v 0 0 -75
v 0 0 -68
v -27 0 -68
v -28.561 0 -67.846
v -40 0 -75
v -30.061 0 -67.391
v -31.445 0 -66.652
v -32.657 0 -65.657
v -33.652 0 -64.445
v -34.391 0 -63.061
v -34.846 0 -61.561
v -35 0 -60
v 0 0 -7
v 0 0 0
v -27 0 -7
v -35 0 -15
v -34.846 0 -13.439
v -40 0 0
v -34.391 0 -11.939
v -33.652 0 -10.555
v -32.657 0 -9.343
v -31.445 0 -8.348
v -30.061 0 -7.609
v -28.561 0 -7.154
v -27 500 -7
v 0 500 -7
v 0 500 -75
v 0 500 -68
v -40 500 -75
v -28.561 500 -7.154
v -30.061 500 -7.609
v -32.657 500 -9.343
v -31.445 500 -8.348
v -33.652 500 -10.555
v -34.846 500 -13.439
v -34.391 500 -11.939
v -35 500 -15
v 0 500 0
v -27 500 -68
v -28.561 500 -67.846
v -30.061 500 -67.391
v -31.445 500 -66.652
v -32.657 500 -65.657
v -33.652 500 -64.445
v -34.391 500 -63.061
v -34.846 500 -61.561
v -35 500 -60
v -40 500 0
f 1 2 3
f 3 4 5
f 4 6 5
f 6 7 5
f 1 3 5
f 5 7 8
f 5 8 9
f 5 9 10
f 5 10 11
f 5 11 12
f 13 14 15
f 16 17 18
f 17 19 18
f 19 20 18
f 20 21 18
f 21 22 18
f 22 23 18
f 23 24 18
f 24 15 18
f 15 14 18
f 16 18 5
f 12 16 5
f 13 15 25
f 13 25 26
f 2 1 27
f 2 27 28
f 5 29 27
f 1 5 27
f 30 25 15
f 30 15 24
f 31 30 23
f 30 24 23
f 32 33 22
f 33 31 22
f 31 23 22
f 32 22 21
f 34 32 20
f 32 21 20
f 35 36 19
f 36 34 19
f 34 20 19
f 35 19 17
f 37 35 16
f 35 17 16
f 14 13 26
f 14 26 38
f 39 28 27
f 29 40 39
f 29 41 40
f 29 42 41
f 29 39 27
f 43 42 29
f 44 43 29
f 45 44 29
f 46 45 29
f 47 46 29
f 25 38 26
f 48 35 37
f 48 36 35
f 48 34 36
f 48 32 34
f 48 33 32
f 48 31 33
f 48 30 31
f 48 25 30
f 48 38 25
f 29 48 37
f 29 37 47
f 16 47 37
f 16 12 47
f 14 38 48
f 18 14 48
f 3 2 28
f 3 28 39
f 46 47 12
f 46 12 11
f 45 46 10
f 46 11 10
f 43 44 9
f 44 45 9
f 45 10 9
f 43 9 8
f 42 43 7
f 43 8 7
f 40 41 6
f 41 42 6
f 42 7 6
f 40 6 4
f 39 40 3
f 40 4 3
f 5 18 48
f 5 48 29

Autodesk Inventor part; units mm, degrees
ref_plane "YZ Plane" through (0, 0, 0) normal (1, 0, 0) x (0, 1, 0)
ref_plane "XZ Plane" through (0, 0, 0) normal (0, 1, 0) x (-1, 0, 0)
ref_plane "XY Plane" through (0, 0, 0) normal (0, 0, 1) x (1, 0, 0)
sketch "Sketch1" plane through (0, 0, 0) normal (0, 1, 0) x (-1, 0, 0)
  point P0 (0, 0)
sketch "Sketch2" plane through (0, 0, 0) normal (0, 1, 0) x (-1, 0, 0)
  line L0 (0, 0) -> (40, 0)
  line L1 (40, 0) -> (40, -75)
  line L2 (40, -75) -> (0, -75)
  line L3 (0, -75) -> (0, -68)
  line L4 (0, -68) -> (27, -68)
  line L5 (35, -60) -> (35, -15)
  line L6 (27, -7) -> (0, -7)
  line L7 (0, -7) -> (0, 0)
  arc A0 (35, -15) -> (27, -7) centre (27, -15) ccw
  arc A1 (27, -68) -> (35, -60) centre (27, -60) ccw
  point P0 (35, -68)
  point P1 (35, -7)
  dimension "d0" = 40
  dimension "d1" = 75
  dimension "d2" = 40
  dimension "d3" = 7
  dimension "d5" = 35
  dimension "d6" = 61
  dimension "d7" = 8
extrude "Extrusion1" add sketch "Sketch2" along normal blind 500
properties part number "Channel2_CPY1"
